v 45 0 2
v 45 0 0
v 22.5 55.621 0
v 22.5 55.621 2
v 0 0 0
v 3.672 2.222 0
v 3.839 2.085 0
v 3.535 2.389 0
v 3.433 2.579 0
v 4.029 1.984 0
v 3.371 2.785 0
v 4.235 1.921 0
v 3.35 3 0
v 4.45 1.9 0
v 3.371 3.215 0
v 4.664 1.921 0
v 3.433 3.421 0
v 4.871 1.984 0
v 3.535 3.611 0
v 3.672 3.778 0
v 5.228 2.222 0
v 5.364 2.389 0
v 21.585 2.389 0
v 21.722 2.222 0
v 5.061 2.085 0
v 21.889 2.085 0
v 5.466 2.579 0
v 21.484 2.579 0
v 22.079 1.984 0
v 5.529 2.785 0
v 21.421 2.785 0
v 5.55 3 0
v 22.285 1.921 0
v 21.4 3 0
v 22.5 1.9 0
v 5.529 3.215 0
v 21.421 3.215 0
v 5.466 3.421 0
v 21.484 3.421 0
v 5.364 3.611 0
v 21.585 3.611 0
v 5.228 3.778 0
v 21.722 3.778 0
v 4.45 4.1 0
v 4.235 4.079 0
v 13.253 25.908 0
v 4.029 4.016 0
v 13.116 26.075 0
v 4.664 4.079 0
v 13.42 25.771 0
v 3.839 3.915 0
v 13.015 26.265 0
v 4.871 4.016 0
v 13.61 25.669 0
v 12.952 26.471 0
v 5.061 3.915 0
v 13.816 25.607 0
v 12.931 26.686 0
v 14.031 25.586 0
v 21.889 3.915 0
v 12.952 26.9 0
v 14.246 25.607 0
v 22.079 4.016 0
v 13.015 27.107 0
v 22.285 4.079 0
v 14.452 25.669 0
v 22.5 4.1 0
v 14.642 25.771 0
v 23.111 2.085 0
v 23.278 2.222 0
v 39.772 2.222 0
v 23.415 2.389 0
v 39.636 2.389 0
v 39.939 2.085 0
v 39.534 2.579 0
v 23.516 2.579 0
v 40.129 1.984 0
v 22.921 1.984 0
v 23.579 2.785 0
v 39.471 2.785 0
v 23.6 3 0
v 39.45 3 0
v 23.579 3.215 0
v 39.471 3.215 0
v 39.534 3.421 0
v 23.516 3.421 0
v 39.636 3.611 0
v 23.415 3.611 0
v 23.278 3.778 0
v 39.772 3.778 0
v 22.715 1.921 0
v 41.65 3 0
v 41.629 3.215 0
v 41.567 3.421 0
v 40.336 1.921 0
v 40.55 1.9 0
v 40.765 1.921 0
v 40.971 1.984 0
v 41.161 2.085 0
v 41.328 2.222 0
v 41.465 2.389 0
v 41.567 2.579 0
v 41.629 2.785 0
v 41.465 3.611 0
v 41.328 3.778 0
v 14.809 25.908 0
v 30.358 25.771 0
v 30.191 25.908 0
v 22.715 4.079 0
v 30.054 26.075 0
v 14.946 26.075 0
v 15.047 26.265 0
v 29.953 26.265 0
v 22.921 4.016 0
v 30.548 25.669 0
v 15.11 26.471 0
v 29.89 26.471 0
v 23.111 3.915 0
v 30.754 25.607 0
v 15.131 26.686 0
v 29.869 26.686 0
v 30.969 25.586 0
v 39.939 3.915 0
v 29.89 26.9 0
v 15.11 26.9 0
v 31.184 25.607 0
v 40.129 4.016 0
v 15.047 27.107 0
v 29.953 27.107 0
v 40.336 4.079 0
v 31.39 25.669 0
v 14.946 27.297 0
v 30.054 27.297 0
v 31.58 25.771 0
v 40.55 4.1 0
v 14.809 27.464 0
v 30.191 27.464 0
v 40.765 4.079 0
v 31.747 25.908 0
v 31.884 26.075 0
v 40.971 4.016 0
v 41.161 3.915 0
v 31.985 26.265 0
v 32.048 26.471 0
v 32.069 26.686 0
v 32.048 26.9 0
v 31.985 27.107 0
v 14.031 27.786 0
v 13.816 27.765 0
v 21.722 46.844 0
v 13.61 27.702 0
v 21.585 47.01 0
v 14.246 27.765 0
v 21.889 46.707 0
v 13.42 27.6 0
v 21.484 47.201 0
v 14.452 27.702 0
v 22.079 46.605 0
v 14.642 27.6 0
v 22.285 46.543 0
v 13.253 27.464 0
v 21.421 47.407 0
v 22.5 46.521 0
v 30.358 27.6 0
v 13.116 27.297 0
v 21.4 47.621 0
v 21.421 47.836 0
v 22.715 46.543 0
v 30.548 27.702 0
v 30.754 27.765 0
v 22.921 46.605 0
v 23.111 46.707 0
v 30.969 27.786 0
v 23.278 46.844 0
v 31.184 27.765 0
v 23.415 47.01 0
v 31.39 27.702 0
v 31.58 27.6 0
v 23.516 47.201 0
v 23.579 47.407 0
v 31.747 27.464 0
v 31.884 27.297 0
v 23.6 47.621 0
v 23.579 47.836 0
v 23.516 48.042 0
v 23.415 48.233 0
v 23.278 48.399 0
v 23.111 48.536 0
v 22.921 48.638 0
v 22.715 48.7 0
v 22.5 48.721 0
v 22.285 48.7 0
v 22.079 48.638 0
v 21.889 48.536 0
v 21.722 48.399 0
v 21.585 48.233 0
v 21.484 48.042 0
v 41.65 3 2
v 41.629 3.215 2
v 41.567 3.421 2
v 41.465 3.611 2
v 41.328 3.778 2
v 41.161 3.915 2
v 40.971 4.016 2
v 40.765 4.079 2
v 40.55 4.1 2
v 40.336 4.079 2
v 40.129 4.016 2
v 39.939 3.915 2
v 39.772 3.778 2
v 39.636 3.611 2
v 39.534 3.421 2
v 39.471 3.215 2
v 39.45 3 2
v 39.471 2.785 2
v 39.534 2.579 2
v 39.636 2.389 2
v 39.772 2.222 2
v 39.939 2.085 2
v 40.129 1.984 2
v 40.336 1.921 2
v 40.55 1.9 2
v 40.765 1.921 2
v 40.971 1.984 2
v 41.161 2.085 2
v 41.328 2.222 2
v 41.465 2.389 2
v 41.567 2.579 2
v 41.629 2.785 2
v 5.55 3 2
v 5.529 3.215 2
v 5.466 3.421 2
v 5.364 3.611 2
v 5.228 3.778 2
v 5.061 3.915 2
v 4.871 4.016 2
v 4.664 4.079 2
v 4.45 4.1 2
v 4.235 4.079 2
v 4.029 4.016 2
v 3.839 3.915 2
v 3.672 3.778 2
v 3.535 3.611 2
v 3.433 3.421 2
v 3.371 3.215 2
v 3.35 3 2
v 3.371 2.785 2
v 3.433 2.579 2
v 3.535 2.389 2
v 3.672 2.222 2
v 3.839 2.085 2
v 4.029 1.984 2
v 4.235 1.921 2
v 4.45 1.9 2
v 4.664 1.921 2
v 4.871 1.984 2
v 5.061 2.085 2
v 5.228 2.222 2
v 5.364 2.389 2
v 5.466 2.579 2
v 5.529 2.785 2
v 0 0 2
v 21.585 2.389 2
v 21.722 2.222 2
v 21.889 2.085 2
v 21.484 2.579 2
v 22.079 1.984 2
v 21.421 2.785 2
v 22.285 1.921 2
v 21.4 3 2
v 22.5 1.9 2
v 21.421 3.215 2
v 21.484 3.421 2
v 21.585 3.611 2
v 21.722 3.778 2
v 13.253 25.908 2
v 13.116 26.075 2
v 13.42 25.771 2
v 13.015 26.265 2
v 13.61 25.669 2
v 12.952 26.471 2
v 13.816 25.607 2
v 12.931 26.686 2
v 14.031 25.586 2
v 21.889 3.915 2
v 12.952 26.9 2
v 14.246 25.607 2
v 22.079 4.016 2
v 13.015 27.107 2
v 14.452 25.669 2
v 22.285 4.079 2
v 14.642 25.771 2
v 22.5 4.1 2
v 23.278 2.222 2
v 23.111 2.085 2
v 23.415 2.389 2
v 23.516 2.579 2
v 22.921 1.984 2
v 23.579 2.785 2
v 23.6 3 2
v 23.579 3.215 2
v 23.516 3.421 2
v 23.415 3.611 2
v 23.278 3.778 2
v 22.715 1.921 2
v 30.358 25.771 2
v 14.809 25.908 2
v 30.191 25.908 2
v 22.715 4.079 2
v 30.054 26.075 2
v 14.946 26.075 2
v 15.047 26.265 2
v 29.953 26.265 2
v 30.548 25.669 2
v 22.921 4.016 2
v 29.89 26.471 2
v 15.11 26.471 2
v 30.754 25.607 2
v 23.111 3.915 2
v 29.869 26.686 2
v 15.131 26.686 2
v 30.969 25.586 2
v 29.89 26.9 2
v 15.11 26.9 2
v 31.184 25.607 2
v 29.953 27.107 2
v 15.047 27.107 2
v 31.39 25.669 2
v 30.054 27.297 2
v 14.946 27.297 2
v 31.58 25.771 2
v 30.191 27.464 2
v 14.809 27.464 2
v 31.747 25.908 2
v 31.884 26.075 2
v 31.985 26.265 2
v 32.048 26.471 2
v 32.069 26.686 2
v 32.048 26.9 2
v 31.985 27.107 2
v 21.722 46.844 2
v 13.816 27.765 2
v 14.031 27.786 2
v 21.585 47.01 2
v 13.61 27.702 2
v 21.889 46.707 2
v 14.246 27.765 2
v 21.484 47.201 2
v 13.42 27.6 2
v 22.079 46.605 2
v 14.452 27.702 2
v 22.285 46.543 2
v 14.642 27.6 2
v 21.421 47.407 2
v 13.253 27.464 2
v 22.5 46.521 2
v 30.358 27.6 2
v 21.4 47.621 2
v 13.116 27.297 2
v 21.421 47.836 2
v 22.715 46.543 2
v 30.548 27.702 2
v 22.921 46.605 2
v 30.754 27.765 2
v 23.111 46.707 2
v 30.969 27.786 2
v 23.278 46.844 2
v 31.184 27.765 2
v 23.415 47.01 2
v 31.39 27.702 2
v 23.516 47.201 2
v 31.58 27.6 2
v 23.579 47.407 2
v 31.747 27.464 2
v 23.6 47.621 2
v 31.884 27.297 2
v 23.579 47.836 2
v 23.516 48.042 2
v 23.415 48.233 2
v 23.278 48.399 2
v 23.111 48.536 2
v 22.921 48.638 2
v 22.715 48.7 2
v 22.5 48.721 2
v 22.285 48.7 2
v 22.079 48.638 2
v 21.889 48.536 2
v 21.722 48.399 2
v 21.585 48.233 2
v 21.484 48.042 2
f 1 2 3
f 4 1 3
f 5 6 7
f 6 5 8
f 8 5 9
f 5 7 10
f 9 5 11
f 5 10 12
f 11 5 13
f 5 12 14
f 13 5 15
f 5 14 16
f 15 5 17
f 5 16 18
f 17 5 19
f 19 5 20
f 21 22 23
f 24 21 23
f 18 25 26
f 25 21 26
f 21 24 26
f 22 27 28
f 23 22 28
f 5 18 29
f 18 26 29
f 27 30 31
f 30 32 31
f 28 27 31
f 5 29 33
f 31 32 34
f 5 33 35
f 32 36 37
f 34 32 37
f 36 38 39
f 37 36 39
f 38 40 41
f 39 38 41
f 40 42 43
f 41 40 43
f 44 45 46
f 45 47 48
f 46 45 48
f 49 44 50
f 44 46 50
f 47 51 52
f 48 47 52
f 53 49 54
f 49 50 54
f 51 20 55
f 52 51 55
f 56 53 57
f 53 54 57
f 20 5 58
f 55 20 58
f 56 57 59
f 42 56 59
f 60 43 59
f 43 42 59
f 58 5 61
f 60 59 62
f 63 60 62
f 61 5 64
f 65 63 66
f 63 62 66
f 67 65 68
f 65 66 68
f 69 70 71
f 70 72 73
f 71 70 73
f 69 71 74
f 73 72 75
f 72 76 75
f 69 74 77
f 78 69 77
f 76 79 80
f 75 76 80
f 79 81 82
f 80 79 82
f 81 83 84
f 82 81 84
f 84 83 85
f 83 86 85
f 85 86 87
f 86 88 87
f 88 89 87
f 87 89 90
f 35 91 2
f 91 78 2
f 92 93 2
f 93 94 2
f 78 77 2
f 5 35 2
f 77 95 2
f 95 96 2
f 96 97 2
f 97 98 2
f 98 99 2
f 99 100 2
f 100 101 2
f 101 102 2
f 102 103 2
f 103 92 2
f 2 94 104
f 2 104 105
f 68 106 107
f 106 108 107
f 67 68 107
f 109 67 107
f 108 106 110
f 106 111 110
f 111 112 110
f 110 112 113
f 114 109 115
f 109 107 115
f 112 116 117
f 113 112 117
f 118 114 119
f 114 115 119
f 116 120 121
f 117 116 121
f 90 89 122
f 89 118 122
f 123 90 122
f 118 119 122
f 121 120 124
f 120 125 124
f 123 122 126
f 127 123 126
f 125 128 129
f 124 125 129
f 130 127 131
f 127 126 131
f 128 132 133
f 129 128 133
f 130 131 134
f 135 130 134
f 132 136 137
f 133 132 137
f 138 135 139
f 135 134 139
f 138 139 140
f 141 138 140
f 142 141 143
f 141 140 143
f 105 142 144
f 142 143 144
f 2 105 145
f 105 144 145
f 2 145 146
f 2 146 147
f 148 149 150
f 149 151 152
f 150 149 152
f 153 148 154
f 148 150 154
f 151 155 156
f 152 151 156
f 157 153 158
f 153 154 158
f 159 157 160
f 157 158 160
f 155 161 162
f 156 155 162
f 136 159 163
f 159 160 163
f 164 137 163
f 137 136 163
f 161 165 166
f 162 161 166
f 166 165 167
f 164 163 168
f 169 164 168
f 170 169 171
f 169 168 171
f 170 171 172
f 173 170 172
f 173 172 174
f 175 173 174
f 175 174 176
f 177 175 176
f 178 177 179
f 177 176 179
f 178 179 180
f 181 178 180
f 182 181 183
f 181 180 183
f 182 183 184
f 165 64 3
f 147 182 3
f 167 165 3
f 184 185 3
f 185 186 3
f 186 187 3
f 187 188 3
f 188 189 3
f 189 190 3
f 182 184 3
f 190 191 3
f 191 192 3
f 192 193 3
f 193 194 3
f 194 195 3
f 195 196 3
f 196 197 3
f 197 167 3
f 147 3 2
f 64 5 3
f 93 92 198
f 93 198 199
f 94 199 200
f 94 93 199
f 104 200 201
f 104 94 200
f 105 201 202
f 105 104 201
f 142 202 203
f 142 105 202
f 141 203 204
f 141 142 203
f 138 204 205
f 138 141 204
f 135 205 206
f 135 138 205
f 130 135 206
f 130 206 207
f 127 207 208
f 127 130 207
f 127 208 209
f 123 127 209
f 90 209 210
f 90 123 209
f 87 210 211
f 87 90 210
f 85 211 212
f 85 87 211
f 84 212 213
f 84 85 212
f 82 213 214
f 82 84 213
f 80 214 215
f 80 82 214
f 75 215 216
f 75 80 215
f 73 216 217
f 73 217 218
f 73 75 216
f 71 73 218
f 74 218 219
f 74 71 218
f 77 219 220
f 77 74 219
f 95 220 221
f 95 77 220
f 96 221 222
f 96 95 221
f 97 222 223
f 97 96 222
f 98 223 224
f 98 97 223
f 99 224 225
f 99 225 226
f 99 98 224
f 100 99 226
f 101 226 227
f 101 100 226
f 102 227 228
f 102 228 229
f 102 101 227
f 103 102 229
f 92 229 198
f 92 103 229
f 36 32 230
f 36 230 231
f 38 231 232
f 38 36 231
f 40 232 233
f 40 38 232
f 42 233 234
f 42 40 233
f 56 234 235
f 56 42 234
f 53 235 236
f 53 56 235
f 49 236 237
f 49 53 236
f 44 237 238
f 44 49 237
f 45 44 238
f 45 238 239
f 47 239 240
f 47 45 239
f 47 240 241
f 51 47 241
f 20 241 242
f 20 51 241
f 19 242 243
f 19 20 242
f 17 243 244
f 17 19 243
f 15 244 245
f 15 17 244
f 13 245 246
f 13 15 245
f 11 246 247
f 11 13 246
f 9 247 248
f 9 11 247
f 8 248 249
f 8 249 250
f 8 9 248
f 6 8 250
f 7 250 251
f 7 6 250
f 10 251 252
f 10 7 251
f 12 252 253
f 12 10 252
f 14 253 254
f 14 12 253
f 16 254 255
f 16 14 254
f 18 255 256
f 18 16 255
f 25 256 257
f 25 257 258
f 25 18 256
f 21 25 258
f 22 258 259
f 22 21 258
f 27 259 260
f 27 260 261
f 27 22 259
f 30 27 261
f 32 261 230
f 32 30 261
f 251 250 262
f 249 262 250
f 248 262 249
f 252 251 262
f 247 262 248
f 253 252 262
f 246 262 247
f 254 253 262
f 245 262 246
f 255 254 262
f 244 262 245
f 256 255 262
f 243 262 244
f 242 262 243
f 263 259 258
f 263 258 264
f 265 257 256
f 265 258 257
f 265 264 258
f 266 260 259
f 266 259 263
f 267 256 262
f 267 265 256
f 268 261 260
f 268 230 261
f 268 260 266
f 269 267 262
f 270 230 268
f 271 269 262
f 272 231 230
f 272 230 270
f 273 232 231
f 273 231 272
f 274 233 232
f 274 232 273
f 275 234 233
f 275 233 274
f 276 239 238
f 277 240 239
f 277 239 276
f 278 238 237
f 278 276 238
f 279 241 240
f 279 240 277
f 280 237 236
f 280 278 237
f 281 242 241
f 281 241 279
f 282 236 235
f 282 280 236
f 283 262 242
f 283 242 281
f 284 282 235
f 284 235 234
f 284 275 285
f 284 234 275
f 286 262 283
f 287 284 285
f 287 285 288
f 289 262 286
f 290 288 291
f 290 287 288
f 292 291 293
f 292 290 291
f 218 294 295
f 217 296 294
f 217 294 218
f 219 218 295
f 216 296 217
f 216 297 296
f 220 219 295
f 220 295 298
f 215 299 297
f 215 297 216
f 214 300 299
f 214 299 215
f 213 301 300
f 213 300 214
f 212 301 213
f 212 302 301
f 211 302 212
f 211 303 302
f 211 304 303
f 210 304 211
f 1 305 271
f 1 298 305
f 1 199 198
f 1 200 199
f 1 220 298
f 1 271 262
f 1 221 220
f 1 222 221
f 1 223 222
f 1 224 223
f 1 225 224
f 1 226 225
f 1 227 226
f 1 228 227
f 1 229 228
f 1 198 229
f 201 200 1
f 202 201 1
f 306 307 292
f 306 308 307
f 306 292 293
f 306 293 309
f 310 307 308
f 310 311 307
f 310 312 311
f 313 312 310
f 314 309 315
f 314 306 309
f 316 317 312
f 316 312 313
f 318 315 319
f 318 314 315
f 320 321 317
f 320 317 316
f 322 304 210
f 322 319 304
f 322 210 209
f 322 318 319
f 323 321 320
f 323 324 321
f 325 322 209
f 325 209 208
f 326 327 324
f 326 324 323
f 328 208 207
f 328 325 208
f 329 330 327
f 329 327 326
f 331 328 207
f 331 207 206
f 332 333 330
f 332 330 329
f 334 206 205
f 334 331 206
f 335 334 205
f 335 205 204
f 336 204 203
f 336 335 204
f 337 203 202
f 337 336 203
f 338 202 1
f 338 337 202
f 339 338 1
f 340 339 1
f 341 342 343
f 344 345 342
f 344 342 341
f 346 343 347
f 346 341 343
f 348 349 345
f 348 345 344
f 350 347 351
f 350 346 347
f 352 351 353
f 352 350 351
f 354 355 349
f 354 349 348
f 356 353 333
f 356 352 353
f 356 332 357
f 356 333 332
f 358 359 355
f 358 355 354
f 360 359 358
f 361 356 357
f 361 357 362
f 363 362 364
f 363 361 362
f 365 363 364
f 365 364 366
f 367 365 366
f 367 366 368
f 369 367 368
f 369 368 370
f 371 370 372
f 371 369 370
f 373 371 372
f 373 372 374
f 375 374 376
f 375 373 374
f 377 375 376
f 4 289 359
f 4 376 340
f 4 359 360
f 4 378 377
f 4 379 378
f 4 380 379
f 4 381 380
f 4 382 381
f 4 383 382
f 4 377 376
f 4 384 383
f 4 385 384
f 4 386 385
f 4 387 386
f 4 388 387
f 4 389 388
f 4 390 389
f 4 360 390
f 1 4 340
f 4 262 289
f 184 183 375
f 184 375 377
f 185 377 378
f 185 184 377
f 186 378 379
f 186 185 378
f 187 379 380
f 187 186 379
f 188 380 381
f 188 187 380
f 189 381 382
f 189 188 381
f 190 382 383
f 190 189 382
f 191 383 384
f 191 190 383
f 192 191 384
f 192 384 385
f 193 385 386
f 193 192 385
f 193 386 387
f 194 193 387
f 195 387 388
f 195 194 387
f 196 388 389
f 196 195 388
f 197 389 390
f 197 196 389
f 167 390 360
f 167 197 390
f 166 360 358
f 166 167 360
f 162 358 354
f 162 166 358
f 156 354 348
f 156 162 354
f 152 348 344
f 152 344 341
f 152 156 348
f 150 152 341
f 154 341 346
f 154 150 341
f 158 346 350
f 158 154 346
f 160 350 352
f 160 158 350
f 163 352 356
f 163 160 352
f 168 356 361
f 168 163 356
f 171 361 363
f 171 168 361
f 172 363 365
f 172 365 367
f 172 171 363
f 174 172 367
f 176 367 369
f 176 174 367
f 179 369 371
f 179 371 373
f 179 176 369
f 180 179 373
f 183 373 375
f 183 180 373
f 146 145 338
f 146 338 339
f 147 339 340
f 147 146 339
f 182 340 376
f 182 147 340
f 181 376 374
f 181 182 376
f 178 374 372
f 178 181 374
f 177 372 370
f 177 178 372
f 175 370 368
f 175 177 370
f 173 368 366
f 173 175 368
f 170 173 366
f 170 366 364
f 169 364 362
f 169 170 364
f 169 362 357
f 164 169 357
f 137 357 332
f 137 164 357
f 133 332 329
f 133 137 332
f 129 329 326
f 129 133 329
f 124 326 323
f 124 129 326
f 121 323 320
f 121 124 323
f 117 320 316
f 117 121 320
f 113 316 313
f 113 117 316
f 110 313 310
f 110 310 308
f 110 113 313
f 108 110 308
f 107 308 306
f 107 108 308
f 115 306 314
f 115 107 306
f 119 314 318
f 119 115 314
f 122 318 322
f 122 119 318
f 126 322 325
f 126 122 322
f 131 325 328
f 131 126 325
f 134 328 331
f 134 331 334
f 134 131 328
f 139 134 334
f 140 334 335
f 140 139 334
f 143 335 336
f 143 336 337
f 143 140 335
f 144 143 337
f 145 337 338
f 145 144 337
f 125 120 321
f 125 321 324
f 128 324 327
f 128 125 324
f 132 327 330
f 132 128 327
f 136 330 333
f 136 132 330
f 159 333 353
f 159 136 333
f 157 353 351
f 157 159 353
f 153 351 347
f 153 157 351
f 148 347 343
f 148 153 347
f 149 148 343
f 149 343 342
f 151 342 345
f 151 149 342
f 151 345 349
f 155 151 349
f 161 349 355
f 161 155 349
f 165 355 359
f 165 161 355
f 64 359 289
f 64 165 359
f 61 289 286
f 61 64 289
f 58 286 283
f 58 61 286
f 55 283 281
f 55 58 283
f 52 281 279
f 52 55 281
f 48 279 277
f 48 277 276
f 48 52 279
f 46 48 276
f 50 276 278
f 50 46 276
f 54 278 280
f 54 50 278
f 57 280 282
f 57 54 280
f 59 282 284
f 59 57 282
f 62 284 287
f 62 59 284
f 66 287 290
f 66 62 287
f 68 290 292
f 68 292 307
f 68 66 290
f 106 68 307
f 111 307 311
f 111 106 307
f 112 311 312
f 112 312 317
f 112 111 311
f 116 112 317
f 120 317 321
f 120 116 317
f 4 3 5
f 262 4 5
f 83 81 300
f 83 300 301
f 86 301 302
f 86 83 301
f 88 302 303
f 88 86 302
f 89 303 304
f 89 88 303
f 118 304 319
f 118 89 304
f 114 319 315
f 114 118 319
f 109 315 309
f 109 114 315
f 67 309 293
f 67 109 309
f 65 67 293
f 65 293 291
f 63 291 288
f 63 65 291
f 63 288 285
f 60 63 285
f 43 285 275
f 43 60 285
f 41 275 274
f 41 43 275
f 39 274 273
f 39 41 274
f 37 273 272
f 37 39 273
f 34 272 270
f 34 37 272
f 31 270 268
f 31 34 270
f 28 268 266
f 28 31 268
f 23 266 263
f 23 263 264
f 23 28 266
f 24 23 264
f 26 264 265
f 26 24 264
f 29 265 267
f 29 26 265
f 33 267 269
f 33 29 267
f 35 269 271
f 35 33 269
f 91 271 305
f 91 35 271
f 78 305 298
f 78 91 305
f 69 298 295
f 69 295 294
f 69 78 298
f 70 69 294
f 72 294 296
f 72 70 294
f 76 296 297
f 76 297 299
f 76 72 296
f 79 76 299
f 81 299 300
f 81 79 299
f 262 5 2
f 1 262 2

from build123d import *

# Parameters (mm, degrees)
ESQUISSE1_R        = 1.1
BOSS_EXTRU_1_DEPTH = 2


with BuildPart() as part:
    # Esquisse1 → Boss.-Extru.1 (new body)
    with BuildSketch(Plane.XY):
        Polygon((0, 0), (45, 0), (22.5, 55.621488653), align=None)
        with Locations((22.5, 3)):
            Circle(ESQUISSE1_R, mode=Mode.SUBTRACT)
        with Locations((14.031074433, 26.685744327)):
            Circle(ESQUISSE1_R, mode=Mode.SUBTRACT)
        with Locations((30.968925567, 26.685744327)):
            Circle(ESQUISSE1_R, mode=Mode.SUBTRACT)
        with Locations((4.449719092, 3)):
            Circle(ESQUISSE1_R, mode=Mode.SUBTRACT)
        with Locations((22.5, 47.621488653)):
            Circle(ESQUISSE1_R, mode=Mode.SUBTRACT)
        with Locations((40.550280908, 3)):
            Circle(ESQUISSE1_R, mode=Mode.SUBTRACT)
    extrude(amount=BOSS_EXTRU_1_DEPTH)


solid = part.part
